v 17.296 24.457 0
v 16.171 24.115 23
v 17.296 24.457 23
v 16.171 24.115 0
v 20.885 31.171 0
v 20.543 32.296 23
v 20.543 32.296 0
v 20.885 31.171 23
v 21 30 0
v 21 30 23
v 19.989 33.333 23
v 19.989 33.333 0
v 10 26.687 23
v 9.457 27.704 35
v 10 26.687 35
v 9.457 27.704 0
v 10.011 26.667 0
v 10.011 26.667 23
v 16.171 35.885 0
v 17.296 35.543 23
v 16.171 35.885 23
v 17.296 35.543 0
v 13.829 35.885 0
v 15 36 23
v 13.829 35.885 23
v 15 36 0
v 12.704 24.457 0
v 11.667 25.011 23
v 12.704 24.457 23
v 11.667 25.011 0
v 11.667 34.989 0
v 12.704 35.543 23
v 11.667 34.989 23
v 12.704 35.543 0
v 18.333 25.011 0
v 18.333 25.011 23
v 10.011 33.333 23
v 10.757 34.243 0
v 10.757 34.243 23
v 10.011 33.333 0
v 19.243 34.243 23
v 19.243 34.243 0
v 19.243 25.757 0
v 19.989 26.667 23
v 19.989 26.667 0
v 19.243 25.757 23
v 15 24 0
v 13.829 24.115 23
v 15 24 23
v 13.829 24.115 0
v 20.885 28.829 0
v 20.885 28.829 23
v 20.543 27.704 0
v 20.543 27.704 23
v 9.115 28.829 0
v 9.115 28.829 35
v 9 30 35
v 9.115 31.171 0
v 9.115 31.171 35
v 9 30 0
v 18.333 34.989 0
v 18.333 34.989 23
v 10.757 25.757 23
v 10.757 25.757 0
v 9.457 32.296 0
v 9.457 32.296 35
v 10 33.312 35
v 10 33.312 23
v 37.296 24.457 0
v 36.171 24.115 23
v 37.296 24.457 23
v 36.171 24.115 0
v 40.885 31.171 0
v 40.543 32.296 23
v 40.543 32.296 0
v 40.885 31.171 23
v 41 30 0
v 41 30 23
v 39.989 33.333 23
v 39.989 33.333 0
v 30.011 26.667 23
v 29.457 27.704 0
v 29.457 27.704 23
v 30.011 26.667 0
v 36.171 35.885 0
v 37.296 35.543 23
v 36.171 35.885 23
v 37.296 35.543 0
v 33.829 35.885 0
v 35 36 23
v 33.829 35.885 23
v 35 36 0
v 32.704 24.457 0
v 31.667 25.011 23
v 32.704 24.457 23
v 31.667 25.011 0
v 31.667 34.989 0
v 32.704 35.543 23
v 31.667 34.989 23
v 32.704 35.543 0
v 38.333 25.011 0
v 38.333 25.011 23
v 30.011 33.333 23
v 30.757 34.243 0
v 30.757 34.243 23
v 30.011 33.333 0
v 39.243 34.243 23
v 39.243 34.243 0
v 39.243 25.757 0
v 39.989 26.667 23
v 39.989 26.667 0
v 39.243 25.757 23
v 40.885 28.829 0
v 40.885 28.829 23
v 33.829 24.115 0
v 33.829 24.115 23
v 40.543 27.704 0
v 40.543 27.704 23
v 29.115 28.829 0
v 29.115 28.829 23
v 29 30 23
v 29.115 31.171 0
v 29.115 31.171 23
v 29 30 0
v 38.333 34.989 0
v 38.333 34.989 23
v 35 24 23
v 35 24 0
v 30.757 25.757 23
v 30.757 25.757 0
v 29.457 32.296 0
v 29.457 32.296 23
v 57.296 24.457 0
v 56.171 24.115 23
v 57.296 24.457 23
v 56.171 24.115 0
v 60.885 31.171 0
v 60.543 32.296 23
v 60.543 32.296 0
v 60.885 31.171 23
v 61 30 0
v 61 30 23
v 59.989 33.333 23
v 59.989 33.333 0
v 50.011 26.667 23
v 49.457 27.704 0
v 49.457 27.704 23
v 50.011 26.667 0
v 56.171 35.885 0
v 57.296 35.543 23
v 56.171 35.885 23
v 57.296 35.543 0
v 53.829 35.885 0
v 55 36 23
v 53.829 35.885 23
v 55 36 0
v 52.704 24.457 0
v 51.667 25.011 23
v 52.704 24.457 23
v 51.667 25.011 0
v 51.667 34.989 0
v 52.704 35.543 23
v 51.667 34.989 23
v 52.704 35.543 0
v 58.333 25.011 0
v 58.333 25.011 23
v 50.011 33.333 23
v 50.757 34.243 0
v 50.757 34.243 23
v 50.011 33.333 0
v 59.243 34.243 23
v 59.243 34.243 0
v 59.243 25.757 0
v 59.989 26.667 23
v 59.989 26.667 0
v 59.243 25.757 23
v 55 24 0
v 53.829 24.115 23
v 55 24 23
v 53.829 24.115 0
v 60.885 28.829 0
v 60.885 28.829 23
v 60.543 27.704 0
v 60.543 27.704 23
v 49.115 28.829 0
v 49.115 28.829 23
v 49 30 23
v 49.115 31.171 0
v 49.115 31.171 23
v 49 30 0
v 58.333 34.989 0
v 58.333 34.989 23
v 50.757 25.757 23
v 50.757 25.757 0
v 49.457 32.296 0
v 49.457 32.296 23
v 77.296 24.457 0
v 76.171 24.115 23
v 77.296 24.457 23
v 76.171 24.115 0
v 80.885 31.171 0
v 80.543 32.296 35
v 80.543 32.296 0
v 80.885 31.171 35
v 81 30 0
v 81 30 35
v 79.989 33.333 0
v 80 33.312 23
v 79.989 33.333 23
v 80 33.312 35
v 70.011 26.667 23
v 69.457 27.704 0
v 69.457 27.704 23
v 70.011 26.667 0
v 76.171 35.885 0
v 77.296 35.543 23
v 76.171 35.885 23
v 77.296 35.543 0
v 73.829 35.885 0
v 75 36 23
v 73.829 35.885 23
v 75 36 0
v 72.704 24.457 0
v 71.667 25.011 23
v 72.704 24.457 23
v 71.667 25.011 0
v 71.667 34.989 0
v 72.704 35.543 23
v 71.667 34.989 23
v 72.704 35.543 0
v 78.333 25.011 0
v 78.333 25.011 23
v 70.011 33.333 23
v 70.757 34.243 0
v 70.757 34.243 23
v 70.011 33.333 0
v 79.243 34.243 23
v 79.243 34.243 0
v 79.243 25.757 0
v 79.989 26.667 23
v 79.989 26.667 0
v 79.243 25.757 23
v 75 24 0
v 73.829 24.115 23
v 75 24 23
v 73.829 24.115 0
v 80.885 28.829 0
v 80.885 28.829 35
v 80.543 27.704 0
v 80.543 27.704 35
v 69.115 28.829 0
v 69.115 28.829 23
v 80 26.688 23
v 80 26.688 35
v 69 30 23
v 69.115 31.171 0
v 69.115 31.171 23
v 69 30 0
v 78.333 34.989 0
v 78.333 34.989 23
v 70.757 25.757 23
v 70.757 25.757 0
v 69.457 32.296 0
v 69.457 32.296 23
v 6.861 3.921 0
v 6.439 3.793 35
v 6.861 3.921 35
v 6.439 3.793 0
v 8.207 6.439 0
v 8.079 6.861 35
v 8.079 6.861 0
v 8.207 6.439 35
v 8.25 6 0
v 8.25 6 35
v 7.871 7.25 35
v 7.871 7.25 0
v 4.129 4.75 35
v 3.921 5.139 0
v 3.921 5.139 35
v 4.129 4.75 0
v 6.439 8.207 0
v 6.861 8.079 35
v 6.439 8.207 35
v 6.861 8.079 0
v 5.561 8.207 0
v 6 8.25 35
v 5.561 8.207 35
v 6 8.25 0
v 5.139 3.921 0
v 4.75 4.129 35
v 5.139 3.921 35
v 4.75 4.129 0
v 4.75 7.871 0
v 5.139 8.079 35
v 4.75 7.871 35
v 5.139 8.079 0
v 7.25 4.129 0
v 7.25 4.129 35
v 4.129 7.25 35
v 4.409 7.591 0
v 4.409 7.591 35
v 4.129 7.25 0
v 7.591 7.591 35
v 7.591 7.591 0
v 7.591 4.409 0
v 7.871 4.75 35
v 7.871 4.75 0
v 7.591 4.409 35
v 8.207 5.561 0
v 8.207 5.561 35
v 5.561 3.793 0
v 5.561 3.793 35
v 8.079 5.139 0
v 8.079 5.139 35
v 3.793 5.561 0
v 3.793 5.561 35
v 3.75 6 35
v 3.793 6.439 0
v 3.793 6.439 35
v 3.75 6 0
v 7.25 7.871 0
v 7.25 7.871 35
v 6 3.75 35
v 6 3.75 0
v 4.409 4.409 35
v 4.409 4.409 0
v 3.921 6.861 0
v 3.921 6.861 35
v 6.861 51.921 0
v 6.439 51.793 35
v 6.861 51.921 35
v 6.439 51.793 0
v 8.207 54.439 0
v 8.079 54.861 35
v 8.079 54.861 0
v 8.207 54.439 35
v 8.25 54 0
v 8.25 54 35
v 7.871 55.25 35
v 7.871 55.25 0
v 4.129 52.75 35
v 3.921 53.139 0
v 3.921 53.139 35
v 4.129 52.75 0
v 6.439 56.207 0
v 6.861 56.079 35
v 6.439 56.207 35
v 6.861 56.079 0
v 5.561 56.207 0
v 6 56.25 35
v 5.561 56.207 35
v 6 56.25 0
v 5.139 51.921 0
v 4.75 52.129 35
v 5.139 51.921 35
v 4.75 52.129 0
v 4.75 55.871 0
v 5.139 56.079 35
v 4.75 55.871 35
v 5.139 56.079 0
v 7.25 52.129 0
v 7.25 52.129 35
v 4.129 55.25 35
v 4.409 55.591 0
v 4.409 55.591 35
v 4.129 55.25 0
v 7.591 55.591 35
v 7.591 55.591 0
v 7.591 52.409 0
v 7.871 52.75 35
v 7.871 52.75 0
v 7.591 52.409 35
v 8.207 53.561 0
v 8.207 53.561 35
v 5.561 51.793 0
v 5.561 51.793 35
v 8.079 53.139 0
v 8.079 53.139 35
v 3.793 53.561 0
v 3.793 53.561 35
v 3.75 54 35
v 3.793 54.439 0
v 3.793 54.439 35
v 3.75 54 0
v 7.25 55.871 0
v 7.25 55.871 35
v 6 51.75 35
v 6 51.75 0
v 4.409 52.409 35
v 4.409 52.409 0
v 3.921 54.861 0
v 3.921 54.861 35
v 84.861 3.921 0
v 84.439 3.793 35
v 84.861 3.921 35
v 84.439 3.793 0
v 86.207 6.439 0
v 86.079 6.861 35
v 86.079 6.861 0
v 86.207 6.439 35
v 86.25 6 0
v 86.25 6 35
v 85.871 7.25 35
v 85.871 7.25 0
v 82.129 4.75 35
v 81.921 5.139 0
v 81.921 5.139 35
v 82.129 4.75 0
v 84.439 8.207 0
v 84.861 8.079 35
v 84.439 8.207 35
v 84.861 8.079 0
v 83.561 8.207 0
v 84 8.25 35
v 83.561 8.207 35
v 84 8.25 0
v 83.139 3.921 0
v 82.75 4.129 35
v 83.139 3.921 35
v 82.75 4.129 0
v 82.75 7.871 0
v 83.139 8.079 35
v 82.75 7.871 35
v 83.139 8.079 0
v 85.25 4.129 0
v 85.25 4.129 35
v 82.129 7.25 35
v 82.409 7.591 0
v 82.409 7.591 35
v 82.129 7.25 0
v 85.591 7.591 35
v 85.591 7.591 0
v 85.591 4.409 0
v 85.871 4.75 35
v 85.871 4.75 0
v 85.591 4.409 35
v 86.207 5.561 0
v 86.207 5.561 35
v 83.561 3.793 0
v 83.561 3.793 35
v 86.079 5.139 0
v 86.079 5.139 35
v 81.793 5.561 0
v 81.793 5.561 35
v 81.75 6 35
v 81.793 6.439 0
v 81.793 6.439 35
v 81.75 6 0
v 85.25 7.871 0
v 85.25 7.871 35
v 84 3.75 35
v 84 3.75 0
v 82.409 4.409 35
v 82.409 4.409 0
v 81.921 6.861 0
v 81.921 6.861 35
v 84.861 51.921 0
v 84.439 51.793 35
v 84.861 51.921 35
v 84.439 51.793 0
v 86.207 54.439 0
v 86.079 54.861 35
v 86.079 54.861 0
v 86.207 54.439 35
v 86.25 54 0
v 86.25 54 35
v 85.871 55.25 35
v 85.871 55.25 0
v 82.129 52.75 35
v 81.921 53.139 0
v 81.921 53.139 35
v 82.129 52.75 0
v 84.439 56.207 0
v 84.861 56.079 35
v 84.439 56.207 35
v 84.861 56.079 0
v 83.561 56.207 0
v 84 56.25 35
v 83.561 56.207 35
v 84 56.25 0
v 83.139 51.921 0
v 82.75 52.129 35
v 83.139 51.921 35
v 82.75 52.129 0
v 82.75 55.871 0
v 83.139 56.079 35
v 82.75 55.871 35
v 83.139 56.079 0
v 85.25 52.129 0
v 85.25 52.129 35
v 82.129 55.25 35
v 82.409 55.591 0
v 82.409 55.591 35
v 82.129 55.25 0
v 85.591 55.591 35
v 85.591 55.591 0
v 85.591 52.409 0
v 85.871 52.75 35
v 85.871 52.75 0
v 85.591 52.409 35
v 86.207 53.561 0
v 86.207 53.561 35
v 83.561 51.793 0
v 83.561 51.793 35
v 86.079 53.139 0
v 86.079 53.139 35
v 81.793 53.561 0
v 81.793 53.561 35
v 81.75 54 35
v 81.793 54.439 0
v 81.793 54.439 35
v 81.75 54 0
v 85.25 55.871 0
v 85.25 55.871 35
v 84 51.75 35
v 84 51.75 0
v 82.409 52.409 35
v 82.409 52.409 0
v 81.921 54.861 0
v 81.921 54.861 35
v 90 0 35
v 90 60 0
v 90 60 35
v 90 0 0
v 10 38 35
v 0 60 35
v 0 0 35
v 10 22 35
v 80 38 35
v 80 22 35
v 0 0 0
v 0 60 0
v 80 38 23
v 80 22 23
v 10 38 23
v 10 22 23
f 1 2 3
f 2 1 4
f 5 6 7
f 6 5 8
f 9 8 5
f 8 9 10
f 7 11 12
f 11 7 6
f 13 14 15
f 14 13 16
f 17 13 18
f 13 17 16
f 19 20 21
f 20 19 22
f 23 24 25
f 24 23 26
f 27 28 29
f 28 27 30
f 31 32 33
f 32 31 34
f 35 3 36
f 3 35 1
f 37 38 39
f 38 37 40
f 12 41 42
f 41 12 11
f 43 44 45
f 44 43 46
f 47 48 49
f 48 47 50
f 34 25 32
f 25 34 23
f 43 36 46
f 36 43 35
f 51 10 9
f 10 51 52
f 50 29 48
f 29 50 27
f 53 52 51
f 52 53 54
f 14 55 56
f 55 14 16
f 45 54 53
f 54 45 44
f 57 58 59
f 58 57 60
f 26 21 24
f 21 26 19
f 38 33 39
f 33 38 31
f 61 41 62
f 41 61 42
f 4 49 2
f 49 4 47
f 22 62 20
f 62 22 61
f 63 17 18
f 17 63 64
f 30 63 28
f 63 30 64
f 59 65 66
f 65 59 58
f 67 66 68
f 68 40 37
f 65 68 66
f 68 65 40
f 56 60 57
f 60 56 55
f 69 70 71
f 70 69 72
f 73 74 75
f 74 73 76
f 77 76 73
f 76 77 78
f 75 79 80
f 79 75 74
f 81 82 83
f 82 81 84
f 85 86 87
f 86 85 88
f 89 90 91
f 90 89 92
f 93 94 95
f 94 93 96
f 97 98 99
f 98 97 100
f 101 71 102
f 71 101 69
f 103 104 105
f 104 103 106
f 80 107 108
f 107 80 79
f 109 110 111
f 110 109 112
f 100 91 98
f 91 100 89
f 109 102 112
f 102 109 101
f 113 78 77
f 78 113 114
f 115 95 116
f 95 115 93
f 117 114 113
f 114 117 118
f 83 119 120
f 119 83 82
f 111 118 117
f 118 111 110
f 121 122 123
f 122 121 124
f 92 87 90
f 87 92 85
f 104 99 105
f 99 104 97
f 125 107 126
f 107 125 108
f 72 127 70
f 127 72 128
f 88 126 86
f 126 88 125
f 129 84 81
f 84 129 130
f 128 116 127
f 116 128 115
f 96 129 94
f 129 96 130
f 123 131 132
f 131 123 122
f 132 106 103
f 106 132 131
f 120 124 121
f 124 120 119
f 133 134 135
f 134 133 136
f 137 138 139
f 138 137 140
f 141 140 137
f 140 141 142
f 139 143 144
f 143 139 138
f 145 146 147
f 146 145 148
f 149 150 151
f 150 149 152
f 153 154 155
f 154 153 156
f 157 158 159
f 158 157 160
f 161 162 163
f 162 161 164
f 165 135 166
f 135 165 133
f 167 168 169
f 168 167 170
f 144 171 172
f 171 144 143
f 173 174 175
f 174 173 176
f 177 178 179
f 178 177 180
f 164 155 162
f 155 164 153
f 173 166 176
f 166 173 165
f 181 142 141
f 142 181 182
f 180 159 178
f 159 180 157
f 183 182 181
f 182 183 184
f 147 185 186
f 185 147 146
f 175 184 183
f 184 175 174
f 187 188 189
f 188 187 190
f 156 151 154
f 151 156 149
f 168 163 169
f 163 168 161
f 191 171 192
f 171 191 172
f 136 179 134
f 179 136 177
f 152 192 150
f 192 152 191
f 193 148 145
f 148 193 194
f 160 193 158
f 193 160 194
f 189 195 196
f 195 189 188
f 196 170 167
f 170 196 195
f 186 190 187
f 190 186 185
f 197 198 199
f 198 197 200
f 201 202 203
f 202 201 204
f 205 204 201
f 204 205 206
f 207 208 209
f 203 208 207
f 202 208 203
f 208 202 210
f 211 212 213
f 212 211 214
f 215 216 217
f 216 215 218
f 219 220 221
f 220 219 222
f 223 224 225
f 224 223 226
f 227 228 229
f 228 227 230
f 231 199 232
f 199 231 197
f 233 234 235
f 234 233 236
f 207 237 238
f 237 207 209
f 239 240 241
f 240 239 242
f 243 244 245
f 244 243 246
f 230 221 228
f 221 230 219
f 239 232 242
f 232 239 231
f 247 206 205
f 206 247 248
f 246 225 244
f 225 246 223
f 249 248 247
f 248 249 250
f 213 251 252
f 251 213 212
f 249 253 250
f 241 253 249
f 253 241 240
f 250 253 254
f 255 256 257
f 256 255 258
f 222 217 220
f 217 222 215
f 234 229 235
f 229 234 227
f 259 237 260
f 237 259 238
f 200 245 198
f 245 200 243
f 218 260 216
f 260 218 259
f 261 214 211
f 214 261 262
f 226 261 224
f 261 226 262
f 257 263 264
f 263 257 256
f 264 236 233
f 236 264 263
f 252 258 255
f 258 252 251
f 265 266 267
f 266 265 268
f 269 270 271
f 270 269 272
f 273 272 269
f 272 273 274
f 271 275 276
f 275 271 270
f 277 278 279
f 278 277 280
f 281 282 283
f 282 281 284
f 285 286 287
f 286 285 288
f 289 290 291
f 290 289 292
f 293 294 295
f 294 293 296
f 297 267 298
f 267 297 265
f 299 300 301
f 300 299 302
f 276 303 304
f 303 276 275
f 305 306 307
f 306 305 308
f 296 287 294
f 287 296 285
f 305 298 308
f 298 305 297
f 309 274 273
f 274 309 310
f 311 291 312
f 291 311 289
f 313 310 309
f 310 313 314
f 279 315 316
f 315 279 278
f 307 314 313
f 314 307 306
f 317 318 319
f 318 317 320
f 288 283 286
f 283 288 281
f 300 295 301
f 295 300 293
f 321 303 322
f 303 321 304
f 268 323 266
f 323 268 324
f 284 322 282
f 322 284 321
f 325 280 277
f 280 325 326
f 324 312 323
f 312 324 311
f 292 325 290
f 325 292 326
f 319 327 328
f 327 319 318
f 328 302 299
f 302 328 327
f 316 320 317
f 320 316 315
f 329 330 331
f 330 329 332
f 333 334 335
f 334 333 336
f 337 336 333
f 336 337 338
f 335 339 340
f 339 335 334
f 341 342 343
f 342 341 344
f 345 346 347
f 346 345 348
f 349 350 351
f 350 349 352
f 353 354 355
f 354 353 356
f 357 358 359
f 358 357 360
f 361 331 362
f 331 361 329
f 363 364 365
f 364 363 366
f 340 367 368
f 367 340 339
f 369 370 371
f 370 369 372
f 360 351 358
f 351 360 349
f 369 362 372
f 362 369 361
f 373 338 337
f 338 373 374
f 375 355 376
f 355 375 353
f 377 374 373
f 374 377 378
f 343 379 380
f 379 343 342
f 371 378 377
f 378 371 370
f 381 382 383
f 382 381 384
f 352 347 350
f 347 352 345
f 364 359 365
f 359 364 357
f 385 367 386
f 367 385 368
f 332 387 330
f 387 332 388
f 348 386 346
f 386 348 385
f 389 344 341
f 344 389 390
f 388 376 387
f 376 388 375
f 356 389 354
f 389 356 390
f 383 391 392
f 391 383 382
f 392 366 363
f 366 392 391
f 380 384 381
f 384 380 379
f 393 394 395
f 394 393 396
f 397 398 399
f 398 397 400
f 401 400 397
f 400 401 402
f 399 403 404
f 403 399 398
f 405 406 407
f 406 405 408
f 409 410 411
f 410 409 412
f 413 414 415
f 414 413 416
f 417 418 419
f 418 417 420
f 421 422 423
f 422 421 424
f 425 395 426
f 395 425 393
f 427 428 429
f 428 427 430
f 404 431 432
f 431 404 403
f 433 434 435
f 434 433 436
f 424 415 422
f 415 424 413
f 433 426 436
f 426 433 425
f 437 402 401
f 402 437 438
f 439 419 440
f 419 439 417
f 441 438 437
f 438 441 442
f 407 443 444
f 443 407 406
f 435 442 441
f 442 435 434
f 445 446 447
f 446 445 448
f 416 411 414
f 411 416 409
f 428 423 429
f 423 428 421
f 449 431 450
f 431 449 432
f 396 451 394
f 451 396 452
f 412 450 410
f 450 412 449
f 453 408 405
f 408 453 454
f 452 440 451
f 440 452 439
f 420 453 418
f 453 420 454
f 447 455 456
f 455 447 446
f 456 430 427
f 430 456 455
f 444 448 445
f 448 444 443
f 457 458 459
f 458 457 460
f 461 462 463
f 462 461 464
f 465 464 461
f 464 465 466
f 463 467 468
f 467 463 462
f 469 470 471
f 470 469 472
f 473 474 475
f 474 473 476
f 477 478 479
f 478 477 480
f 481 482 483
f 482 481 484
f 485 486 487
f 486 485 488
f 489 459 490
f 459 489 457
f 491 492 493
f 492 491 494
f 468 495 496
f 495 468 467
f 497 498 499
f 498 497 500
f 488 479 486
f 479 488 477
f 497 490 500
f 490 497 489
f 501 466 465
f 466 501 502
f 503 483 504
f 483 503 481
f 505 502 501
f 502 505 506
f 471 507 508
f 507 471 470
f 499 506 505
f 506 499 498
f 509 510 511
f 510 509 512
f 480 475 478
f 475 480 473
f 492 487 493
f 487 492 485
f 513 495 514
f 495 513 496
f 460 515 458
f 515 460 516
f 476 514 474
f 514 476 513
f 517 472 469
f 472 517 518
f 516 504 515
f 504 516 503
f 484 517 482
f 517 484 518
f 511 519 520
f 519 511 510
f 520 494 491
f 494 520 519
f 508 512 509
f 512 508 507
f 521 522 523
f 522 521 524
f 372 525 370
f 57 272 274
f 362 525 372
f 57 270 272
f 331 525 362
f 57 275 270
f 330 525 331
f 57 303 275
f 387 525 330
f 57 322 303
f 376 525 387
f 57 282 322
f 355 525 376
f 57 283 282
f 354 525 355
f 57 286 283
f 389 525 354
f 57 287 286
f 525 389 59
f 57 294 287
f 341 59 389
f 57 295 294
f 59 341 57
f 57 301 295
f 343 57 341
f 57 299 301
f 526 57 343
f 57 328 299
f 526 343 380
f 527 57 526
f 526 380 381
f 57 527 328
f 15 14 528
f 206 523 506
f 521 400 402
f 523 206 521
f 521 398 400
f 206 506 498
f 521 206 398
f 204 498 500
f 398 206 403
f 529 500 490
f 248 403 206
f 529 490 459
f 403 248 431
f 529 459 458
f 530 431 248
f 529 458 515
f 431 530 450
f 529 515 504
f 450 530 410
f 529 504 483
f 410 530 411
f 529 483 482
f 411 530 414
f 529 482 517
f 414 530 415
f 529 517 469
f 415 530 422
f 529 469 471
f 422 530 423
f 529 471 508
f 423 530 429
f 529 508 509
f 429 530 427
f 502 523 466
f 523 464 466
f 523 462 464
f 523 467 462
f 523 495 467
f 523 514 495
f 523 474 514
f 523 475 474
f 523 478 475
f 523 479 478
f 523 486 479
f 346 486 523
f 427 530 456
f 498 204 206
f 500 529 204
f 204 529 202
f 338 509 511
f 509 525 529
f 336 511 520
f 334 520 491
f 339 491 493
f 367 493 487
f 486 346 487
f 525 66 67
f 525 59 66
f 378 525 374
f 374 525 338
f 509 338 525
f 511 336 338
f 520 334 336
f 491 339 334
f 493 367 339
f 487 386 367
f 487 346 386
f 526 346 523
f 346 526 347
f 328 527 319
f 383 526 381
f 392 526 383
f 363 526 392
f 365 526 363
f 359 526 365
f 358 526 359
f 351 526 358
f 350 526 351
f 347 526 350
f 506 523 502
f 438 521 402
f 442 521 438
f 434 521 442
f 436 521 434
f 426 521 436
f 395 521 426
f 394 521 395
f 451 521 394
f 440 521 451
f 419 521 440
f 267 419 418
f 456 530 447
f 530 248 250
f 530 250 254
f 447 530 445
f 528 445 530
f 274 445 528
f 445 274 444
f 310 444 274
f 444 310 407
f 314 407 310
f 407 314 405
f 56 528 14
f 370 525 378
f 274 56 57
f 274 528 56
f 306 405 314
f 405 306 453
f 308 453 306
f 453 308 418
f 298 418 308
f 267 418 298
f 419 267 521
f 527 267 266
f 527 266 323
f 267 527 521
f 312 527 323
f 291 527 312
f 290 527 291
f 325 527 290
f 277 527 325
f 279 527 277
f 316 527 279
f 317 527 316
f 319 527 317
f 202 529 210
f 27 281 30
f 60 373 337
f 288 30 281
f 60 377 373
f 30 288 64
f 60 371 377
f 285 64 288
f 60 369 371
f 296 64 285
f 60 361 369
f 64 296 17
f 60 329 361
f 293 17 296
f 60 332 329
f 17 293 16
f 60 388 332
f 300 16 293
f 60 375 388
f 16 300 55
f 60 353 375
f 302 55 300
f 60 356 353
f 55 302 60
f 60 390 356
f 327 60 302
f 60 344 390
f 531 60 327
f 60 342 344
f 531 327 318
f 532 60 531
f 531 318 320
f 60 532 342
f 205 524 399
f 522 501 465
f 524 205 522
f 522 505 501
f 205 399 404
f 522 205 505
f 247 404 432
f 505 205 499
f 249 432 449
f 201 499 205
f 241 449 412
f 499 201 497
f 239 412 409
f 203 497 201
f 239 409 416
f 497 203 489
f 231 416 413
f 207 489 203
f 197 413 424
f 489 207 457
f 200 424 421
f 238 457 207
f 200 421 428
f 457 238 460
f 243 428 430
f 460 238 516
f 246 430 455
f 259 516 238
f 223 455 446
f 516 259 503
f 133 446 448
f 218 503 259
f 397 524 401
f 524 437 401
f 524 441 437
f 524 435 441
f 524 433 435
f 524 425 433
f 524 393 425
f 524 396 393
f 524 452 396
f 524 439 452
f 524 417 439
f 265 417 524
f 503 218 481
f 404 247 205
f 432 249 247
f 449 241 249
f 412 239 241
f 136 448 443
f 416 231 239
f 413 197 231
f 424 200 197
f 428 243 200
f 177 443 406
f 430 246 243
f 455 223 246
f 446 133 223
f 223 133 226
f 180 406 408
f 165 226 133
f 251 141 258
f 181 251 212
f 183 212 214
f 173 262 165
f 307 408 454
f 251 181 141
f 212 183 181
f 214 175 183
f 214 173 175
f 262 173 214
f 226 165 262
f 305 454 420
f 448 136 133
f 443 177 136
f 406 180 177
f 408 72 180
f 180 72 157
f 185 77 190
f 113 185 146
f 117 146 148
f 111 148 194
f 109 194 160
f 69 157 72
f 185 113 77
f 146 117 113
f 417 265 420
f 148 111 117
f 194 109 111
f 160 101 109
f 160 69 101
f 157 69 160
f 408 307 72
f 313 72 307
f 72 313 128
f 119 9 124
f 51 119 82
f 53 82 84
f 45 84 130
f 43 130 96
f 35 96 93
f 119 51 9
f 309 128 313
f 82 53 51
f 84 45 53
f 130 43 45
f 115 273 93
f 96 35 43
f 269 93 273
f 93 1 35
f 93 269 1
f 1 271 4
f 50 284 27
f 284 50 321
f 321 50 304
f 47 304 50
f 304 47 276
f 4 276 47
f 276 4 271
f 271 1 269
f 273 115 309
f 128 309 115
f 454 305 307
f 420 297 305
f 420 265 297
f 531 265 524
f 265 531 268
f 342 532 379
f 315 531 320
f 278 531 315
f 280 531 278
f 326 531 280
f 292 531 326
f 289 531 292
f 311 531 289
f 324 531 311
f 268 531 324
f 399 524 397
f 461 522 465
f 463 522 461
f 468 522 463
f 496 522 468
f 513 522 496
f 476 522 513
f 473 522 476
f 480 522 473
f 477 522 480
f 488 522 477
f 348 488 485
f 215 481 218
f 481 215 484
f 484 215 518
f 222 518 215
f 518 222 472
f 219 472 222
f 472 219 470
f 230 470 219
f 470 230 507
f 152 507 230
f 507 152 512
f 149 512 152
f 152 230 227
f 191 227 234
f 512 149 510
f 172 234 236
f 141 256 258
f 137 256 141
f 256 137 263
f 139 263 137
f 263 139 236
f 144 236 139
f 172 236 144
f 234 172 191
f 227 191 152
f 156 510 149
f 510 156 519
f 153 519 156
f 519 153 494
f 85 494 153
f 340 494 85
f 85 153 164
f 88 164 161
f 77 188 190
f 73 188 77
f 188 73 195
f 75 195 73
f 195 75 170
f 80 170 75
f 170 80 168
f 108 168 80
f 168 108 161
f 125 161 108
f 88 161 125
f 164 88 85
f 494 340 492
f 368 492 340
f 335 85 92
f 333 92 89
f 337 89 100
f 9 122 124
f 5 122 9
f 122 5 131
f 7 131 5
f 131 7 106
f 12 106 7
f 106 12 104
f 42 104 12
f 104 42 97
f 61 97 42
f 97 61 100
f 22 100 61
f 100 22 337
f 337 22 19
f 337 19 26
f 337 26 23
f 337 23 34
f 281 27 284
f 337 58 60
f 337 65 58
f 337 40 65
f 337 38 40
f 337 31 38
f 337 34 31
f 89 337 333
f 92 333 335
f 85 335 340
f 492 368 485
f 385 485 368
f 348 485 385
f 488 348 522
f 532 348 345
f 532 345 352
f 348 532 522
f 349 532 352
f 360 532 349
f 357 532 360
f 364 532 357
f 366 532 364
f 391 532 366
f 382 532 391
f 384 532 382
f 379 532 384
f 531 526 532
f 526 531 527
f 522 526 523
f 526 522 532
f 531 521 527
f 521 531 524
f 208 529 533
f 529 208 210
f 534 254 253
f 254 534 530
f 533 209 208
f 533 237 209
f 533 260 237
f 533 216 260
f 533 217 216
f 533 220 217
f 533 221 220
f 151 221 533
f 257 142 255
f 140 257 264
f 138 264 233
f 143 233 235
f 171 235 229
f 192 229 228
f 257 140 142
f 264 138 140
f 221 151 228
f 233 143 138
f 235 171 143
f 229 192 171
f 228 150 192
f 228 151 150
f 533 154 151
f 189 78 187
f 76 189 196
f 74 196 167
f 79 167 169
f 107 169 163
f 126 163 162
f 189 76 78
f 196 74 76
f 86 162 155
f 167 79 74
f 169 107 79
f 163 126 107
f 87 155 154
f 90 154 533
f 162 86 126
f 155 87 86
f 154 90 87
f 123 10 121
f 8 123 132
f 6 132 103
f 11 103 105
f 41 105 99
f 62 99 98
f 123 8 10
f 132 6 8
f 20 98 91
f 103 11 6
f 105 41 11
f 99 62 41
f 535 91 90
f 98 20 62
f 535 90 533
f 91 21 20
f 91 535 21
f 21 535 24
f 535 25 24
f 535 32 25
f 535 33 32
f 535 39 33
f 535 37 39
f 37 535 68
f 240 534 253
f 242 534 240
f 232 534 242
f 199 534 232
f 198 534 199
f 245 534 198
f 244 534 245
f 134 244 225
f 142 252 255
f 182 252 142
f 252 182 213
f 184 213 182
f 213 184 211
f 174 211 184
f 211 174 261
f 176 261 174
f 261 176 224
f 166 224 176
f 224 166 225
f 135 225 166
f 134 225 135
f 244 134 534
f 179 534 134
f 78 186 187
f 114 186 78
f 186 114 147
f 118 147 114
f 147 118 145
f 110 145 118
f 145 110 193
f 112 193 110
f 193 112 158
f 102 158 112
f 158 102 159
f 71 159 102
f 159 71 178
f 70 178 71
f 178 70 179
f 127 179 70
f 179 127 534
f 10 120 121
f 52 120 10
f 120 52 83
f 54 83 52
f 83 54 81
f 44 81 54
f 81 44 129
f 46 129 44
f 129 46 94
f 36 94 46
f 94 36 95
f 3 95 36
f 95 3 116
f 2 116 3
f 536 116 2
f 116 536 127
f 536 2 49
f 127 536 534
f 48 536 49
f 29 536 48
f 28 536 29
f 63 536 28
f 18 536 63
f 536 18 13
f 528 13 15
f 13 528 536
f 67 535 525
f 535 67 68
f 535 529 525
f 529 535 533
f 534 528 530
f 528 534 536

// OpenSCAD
$fn = 32;

// ----------------------------------------------------------------------
// Manifold block: gallery_top manifold
// ----------------------------------------------------------------------

// --- parameters (mm) ---
block_l = 90;             // block length, X
block_w = 60;             // block width, Y
block_h = 35;             // block height, Z
port_d = 12;              // port bore diameter
port_pitch = 20;          // port pitch along X
gallery_d = 16;           // top gallery width, Y
gallery_depth = 12;       // gallery pocket depth
wall_p = 10;              // gallery end wall thickness, X
mnt_d = 4.5;              // mounting hole diameter
mnt_in = 6;               // mounting hole inset from the edges

n_ports = 4;  // ports in the row
port_x0 = (block_l - (n_ports - 1) * port_pitch) / 2;  // first port X

difference() {
  cube([block_l, block_w, block_h]);
  for (i = [0 : n_ports - 1])
    translate([port_x0 + i * port_pitch, block_w / 2, -1])
      cylinder(h = block_h + 2, d = port_d);
  translate([wall_p, block_w / 2 - gallery_d / 2, block_h - gallery_depth])
    cube([block_l - 2 * wall_p, gallery_d, gallery_depth + 1]);
  for (cx = [mnt_in, block_l - mnt_in])
    for (cy = [mnt_in, block_w - mnt_in])
      translate([cx, cy, -1]) cylinder(h = block_h + 2, d = mnt_d);
}
